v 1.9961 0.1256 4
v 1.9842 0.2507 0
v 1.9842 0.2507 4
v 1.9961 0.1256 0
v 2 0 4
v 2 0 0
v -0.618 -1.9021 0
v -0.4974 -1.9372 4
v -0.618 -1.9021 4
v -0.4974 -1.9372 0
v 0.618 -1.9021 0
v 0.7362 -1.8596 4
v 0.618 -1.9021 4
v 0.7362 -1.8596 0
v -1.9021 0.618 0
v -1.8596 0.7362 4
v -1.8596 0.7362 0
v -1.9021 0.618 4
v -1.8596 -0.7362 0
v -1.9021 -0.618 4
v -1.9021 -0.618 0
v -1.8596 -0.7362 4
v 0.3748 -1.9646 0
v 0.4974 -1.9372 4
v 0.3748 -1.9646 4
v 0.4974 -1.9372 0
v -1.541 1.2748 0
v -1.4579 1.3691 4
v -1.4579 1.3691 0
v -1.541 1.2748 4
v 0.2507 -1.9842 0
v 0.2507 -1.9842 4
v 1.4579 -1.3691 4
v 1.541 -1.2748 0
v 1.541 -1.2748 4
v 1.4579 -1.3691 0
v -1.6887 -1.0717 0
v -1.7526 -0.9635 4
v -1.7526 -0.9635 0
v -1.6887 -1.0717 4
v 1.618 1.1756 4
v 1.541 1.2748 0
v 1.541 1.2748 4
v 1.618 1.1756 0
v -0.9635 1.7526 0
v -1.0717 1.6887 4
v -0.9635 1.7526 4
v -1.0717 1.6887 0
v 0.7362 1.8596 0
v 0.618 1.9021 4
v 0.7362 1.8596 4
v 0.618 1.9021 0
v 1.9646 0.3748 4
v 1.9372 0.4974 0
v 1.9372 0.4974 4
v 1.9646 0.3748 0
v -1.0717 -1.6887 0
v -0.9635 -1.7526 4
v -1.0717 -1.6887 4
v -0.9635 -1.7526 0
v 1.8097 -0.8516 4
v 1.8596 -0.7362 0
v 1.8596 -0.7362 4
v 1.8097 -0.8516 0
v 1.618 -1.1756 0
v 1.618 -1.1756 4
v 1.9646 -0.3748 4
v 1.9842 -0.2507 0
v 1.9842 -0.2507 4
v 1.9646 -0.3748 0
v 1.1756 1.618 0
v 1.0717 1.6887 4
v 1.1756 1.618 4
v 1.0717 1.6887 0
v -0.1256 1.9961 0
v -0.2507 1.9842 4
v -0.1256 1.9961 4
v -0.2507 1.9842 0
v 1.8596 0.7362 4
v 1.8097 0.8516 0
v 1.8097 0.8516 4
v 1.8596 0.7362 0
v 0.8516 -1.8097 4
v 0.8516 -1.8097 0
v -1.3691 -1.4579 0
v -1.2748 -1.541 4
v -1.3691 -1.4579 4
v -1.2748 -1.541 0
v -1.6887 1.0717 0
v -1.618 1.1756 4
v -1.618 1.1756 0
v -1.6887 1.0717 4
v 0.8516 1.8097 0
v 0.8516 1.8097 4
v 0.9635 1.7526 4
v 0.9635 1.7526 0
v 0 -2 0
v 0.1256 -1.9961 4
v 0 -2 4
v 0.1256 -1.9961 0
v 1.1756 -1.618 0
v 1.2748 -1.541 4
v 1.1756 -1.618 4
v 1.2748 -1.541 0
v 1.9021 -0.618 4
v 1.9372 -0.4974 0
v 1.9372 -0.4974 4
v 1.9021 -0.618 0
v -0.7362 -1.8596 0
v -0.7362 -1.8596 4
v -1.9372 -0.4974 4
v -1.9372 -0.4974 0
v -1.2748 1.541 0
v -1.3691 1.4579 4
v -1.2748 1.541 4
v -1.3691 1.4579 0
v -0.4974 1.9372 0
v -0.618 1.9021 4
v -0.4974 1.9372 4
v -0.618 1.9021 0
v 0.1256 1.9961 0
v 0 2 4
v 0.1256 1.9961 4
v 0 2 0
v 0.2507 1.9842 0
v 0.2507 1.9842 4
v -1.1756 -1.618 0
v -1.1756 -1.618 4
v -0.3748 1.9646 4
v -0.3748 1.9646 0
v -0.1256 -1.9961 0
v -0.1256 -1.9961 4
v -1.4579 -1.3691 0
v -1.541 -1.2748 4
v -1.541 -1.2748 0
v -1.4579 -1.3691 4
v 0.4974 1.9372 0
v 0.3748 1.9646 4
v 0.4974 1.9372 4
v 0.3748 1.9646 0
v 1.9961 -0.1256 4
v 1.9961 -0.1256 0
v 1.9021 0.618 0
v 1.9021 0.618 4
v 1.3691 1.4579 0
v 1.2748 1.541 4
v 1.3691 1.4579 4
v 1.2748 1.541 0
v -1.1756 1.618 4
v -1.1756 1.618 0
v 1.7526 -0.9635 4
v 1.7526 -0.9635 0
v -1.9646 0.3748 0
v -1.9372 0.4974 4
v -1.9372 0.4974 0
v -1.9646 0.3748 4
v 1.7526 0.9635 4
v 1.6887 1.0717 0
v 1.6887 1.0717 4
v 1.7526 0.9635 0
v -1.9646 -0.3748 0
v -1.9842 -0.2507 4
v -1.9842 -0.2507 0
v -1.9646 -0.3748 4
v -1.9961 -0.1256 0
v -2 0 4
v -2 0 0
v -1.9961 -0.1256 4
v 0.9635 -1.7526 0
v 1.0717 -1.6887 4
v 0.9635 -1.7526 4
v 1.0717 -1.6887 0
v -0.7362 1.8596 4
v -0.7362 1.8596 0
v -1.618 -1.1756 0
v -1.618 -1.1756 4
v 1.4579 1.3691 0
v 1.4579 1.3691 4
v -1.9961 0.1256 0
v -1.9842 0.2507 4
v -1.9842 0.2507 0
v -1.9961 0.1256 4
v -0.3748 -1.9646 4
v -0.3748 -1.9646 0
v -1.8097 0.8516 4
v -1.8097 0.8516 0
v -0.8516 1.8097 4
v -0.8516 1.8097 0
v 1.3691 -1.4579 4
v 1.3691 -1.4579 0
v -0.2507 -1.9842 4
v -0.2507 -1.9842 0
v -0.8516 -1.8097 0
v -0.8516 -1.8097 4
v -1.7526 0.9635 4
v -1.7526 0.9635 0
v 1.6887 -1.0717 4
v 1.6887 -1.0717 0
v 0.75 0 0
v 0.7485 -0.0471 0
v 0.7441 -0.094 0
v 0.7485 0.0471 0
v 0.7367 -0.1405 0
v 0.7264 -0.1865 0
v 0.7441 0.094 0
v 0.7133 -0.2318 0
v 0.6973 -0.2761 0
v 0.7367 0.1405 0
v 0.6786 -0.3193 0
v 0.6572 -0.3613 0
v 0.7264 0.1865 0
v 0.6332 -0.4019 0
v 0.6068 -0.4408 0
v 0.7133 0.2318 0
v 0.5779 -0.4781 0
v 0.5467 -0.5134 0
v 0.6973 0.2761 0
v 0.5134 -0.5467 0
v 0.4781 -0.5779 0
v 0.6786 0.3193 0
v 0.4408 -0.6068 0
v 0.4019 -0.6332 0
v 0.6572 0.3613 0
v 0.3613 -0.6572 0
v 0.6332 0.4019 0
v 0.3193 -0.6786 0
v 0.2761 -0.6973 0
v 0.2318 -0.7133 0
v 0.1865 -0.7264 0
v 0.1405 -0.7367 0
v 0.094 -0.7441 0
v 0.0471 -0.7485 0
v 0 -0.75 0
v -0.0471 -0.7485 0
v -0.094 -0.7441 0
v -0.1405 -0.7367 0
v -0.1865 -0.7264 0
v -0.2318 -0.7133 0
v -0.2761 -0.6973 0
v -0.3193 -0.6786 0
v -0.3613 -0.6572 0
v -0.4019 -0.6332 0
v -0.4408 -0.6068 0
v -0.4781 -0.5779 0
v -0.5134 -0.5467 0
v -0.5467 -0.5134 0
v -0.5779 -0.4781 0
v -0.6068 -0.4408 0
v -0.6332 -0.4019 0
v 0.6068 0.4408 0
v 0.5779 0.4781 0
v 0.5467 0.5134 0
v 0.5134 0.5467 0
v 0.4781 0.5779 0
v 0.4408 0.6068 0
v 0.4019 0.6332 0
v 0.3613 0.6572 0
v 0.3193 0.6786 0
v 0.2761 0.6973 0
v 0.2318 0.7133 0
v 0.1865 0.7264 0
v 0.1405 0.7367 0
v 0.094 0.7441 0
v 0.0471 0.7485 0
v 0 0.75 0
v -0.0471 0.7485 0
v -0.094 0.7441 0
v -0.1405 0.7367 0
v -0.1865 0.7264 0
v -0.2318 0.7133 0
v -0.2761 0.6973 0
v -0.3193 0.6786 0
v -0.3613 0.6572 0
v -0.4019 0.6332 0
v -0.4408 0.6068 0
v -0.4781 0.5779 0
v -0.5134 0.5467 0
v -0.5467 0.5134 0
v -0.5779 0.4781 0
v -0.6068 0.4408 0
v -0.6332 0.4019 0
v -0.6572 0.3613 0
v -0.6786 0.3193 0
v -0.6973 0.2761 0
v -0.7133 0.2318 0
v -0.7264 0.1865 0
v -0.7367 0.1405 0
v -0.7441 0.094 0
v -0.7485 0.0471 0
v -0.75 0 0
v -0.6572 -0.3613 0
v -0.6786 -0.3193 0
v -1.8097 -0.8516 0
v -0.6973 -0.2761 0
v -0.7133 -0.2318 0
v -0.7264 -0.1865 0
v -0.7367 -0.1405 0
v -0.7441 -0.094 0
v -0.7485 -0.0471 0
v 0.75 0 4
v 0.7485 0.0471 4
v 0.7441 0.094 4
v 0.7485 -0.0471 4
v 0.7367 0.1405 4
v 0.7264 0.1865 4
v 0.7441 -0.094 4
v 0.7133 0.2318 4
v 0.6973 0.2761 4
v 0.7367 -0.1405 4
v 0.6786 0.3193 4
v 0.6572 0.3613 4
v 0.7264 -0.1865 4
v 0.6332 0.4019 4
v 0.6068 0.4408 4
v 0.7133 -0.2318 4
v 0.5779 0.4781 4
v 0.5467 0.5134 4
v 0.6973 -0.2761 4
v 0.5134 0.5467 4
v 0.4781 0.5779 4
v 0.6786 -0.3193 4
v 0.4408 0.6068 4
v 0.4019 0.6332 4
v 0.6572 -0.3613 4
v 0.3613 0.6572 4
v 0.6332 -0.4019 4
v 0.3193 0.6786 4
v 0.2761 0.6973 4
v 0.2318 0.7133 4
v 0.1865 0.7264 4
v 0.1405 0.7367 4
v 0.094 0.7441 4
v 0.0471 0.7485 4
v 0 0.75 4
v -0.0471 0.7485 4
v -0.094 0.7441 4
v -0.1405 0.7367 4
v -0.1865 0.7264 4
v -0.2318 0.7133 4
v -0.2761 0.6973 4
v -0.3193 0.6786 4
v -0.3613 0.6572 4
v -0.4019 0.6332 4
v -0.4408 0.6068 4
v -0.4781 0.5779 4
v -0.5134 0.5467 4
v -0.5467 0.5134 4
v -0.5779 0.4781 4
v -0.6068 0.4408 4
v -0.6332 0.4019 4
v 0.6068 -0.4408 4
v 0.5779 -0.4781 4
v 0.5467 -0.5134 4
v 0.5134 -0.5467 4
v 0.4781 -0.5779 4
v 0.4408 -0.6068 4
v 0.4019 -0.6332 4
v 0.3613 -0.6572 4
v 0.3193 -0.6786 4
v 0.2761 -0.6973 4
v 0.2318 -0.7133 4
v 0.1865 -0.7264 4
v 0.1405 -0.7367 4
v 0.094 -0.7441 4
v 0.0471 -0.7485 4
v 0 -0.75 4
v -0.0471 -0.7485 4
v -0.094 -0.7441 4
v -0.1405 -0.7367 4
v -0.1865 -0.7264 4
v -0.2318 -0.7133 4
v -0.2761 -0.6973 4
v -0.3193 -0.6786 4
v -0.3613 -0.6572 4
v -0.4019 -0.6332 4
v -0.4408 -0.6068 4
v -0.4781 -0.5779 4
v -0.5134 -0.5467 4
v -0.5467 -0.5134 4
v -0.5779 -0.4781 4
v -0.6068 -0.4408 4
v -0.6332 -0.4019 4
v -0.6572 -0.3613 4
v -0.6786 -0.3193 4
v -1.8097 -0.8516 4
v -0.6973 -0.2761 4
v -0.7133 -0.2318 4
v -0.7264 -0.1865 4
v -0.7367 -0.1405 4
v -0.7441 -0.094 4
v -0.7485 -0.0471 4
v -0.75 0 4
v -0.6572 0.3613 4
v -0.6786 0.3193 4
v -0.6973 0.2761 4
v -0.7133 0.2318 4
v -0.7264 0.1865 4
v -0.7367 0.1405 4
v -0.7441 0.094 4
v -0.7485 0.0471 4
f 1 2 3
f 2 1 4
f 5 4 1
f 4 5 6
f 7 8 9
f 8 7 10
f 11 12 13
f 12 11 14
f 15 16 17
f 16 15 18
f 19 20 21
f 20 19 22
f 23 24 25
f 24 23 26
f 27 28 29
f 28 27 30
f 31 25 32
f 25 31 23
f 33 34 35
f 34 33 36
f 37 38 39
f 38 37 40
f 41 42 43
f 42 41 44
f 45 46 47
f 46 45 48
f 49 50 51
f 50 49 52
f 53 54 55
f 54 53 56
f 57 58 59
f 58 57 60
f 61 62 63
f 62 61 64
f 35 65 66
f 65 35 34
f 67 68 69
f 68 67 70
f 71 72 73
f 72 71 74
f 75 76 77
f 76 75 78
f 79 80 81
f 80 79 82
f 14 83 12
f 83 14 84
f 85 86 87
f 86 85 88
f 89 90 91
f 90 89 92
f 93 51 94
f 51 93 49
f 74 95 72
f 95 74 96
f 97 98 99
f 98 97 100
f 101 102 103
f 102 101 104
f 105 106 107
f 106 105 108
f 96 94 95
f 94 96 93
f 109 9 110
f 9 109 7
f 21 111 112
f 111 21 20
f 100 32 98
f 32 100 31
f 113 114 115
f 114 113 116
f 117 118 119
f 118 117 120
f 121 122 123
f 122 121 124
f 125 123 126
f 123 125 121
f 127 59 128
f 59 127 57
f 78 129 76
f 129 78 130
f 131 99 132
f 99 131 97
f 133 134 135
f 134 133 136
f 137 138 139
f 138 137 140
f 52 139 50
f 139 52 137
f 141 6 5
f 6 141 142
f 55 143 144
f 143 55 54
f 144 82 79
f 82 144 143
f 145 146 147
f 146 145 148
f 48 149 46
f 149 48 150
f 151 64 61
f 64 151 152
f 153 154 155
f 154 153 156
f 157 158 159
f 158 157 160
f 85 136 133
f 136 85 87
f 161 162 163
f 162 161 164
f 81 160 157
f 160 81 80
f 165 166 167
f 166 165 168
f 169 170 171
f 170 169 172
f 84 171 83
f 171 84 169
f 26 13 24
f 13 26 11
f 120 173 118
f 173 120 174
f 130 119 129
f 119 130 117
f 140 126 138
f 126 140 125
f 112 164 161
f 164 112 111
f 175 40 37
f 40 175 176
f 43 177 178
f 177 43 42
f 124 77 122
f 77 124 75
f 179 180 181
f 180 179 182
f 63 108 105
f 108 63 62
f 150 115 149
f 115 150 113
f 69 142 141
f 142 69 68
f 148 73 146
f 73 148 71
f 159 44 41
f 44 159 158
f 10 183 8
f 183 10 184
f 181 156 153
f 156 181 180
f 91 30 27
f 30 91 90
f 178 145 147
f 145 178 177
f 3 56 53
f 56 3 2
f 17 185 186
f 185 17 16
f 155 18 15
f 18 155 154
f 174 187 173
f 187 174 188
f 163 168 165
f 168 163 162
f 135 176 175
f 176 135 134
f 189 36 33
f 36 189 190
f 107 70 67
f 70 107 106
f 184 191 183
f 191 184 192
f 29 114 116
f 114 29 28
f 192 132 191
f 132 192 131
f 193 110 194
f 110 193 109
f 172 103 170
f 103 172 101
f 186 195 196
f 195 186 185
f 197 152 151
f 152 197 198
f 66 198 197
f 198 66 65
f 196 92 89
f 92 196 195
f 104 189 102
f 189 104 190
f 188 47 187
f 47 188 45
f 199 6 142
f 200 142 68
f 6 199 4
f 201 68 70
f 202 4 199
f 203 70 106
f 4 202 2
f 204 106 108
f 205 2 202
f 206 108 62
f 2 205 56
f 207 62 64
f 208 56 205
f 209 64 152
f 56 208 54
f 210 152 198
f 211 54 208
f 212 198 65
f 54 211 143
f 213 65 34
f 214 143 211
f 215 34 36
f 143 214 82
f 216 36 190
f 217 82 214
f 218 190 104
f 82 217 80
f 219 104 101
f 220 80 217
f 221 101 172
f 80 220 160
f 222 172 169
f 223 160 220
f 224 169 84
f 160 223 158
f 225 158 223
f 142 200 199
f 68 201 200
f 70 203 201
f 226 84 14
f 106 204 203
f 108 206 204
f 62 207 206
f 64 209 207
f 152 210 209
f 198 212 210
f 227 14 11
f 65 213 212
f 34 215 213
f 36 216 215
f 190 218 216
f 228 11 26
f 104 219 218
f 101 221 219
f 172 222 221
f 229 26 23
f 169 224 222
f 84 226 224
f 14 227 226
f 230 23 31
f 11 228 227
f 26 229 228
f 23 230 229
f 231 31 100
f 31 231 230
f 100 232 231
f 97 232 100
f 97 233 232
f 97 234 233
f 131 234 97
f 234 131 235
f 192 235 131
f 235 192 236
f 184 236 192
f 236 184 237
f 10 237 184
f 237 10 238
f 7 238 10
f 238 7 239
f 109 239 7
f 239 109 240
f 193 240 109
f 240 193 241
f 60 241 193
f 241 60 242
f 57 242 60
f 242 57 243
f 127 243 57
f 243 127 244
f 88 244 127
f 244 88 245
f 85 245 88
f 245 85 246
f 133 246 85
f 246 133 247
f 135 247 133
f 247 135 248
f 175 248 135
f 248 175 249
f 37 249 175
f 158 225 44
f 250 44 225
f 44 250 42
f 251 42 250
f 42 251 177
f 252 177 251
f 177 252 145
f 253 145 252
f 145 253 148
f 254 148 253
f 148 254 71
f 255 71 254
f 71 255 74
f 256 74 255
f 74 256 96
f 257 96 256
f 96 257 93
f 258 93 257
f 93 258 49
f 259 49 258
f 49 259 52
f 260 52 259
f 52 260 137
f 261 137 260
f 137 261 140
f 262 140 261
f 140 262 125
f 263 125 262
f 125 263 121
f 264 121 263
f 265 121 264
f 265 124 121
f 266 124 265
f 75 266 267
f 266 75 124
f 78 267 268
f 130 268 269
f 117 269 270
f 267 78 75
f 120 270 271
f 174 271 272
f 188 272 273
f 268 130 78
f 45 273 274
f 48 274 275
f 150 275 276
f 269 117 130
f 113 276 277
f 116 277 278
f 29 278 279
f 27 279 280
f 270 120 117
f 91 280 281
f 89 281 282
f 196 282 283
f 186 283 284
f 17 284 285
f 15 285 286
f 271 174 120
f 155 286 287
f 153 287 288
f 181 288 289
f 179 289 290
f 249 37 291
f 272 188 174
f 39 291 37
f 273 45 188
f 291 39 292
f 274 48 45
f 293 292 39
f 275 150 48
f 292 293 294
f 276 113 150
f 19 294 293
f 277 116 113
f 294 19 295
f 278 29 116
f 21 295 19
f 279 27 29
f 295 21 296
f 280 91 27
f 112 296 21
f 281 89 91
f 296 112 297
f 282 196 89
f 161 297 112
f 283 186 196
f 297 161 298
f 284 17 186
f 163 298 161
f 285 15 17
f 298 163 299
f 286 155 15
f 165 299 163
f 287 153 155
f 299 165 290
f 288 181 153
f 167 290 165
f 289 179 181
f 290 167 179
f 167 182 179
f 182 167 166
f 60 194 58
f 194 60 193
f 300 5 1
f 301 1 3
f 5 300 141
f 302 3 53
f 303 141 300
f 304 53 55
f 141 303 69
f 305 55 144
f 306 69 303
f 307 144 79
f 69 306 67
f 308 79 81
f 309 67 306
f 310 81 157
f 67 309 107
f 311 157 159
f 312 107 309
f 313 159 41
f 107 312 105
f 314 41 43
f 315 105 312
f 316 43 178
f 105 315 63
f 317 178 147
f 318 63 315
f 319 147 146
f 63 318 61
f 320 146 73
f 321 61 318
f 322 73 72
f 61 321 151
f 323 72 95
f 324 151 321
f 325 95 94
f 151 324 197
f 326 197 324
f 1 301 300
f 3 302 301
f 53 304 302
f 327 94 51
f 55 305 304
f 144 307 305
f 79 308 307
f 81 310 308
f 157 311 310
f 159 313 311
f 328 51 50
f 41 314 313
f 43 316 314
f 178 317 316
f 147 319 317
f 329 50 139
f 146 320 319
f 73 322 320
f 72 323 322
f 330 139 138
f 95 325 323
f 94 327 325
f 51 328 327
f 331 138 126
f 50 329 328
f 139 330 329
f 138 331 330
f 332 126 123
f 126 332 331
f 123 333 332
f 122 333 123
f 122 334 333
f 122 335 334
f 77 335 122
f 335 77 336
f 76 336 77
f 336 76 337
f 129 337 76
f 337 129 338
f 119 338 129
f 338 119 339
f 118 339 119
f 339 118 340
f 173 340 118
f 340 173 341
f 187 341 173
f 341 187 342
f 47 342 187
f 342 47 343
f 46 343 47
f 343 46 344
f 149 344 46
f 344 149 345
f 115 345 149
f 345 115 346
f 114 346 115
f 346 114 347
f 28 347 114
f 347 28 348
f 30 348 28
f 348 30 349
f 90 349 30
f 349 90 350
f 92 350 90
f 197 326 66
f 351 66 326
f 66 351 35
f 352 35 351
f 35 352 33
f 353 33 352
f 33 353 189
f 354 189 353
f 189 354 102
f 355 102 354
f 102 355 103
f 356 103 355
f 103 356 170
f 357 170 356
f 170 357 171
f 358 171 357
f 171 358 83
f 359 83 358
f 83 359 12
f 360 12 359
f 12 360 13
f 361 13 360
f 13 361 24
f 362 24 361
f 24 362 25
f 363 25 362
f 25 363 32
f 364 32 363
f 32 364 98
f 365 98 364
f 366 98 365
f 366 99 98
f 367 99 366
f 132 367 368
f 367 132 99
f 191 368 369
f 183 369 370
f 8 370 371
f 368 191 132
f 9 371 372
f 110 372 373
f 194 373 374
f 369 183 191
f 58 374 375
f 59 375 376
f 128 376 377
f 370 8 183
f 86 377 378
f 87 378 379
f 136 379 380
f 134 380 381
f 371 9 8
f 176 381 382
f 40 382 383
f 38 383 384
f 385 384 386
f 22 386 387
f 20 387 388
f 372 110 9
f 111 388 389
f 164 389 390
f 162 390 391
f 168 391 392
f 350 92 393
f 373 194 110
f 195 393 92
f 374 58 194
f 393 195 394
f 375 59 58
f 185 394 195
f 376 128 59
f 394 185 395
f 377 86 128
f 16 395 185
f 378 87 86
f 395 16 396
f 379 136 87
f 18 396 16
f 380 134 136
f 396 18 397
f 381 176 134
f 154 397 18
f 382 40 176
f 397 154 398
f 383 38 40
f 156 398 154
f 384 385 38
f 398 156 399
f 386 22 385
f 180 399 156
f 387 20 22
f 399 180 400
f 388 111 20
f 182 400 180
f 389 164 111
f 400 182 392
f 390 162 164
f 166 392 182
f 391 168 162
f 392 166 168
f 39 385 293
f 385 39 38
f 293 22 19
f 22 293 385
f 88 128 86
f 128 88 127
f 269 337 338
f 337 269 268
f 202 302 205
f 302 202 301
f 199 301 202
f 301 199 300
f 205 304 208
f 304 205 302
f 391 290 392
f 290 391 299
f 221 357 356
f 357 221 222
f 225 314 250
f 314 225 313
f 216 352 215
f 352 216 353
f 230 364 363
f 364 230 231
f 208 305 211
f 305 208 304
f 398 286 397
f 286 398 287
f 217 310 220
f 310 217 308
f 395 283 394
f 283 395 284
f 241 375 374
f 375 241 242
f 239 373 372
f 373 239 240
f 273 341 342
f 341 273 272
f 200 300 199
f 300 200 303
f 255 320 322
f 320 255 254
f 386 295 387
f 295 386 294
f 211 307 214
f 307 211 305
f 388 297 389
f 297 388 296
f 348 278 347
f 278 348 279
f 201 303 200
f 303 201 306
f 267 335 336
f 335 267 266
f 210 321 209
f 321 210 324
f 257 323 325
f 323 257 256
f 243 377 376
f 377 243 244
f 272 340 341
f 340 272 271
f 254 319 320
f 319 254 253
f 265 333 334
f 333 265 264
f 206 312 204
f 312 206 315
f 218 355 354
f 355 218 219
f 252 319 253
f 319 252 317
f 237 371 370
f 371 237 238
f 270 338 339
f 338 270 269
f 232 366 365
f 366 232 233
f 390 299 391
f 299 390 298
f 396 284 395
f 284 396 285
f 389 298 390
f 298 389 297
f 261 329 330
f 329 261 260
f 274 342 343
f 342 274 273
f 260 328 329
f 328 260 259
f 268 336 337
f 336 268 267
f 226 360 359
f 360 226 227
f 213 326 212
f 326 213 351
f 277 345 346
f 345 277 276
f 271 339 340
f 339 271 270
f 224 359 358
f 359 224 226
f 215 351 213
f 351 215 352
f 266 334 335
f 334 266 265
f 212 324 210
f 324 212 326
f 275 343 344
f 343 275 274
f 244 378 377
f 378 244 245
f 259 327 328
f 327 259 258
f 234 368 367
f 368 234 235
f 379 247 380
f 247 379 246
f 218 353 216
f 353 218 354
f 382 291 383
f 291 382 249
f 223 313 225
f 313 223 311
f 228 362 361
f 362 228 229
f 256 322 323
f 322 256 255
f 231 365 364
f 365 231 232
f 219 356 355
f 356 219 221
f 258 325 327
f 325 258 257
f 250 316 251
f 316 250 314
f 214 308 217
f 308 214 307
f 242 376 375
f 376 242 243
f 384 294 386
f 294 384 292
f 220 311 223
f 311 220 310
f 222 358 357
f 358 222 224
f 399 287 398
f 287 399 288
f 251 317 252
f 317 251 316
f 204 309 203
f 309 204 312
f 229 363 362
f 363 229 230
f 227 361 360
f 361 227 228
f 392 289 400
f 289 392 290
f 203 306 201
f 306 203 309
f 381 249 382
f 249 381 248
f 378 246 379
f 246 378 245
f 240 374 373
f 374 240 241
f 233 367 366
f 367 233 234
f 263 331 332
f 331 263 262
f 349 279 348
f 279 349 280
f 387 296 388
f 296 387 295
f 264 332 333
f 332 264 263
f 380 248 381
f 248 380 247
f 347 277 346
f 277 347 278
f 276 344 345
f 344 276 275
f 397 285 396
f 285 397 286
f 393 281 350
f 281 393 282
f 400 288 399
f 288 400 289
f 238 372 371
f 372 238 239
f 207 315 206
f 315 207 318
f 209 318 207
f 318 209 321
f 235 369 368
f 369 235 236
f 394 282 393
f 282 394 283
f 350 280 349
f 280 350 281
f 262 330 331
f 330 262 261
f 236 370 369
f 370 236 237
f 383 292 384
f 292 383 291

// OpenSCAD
$fn=100;
difference(){
cylinder(h=4,d=4);
cylinder(h=4,d=1.5);
}
